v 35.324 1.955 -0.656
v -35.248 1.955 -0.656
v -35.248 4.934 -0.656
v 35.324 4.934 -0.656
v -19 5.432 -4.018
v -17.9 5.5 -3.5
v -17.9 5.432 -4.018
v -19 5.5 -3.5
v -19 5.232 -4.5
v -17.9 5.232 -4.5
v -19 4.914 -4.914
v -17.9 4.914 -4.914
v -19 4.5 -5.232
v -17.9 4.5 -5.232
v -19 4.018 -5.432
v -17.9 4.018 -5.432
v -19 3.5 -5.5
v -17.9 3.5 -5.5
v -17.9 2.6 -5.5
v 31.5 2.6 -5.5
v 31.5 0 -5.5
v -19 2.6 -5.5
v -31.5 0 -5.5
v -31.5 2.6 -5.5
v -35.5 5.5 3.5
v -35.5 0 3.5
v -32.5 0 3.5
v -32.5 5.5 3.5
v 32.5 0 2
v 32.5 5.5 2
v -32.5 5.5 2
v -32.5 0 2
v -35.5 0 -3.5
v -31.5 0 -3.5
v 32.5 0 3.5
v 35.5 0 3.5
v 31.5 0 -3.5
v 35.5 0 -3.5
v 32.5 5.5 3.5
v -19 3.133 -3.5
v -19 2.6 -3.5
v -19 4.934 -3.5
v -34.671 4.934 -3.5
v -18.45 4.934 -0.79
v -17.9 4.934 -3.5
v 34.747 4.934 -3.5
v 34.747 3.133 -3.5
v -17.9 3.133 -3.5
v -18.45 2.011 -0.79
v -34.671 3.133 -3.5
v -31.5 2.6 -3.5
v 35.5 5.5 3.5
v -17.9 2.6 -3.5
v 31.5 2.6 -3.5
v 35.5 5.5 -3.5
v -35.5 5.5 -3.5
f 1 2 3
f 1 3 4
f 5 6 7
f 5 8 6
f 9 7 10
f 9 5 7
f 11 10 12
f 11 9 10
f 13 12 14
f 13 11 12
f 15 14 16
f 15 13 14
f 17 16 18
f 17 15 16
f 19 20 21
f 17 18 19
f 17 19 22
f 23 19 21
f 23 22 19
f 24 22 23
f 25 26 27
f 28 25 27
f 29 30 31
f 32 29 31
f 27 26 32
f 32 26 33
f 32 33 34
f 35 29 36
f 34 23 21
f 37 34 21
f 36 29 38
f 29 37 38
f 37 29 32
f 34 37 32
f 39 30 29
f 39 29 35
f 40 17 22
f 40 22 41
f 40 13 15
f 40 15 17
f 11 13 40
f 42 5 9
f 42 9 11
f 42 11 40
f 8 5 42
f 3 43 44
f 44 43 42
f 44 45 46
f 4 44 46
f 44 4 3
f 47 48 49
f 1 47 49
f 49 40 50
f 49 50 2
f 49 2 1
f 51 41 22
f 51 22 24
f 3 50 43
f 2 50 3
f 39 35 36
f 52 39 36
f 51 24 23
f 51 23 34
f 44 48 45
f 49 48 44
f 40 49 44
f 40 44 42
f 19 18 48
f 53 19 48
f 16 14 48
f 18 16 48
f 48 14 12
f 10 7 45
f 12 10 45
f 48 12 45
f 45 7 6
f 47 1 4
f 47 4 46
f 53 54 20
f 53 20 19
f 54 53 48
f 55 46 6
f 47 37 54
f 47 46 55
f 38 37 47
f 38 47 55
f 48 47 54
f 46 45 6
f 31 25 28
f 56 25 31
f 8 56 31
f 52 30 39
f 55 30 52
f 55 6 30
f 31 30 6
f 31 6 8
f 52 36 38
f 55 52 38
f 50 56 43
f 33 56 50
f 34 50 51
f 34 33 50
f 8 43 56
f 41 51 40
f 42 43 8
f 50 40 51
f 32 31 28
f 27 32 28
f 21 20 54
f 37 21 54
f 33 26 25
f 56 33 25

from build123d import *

# Parameters (mm, degrees)
SKETCH1_W          = 71
SKETCH1_H          = 7
EXTRUDE1_DEPTH     = 5.5
SKETCH2_W          = 65
SKETCH2_H          = 2.766320183
CUT_EXTRUDE1_DEPTH = 7.5
SKETCH3_W          = 63
SKETCH3_H          = 2
EXTRUDE2_DEPTH     = 5.5
SKETCH4_W          = 49.4
SKETCH4_H          = 2
SKETCH4_W_2        = 12.5
CUT_EXTRUDE2_DEPTH = 2.9
FILLET1_R          = 2
EXTRUDE3_START     = 1.955331485
EXTRUDE3_DEPTH     = 2.978778395
EXTRUDE3_START_2   = -35.5
EXTRUDE3_2_DEPTH   = 71


with BuildPart() as part:
    # Sketch1 → Extrude1 (new body)
    with BuildSketch(Plane(origin=(0, 0, 0), x_dir=(1, 0, 0), z_dir=(0, 1, 0))):
        Rectangle(SKETCH1_W, SKETCH1_H)
    extrude(amount=EXTRUDE1_DEPTH)

    # Sketch2 → Cut-Extrude1 (cut)
    with BuildSketch(Plane(origin=(0, 5.5, 0), x_dir=(-1, 0, 0), z_dir=(0, 1, 0))):
        with Locations((0, 3.383160092)):
            Rectangle(SKETCH2_W, SKETCH2_H)
    extrude(amount=-CUT_EXTRUDE1_DEPTH, mode=Mode.SUBTRACT)

    # Sketch3 → Extrude2 (add)
    with BuildSketch(Plane(origin=(0, 5.5, 0), x_dir=(-1, 0, 0), z_dir=(0, 1, 0))):
        with Locations((0, -4.5)):
            Rectangle(SKETCH3_W, SKETCH3_H)
    extrude(amount=-EXTRUDE2_DEPTH)

    # Sketch4 → Cut-Extrude2 (cut)
    with BuildSketch(Plane(origin=(0, 5.5, 0), x_dir=(-1, 0, 0), z_dir=(0, 1, 0))):
        with Locations((-6.8, -4.5)):
            Rectangle(SKETCH4_W, SKETCH4_H)
        with Locations((25.25, -4.5)):
            Rectangle(SKETCH4_W_2, SKETCH4_H)
    extrude(amount=-CUT_EXTRUDE2_DEPTH, mode=Mode.SUBTRACT)

    # Fillet1
    fillet1_edges = [part.edges().sort_by_distance(p)[0] for p in [
        (-18.45, 5.5, -5.5),
    ]]
    fillet(fillet1_edges, radius=FILLET1_R)

    # Extrude3: read off the stored shape, not the designer's step
    # Extrude3 outline → Extrude3 (cut)
    with BuildSketch(Plane(origin=(0, 0, 0), x_dir=(1, 0, 0), z_dir=(0, 1, 0)).offset(EXTRUDE3_START)):
        Polygon((-19, 3.5), (-34.670728733, 3.5), (-35.248026649, 0.655722687), (35.324444086, 0.655722687), (34.74714617, 3.5), (-17.9, 3.5), (-18.45, 0.790216232), align=None)
    extrude(amount=EXTRUDE3_DEPTH, mode=Mode.SUBTRACT)

    # Extrude3 2 outline → Extrude3 2 (add)
    with BuildSketch(Plane.YZ.offset(EXTRUDE3_START_2)):
        Polygon((1.955331485, -3.5), (3.133469723, -3.5), (1.955331485, -0.655722687), align=None)
    extrude(amount=EXTRUDE3_2_DEPTH)


solid = part.part
